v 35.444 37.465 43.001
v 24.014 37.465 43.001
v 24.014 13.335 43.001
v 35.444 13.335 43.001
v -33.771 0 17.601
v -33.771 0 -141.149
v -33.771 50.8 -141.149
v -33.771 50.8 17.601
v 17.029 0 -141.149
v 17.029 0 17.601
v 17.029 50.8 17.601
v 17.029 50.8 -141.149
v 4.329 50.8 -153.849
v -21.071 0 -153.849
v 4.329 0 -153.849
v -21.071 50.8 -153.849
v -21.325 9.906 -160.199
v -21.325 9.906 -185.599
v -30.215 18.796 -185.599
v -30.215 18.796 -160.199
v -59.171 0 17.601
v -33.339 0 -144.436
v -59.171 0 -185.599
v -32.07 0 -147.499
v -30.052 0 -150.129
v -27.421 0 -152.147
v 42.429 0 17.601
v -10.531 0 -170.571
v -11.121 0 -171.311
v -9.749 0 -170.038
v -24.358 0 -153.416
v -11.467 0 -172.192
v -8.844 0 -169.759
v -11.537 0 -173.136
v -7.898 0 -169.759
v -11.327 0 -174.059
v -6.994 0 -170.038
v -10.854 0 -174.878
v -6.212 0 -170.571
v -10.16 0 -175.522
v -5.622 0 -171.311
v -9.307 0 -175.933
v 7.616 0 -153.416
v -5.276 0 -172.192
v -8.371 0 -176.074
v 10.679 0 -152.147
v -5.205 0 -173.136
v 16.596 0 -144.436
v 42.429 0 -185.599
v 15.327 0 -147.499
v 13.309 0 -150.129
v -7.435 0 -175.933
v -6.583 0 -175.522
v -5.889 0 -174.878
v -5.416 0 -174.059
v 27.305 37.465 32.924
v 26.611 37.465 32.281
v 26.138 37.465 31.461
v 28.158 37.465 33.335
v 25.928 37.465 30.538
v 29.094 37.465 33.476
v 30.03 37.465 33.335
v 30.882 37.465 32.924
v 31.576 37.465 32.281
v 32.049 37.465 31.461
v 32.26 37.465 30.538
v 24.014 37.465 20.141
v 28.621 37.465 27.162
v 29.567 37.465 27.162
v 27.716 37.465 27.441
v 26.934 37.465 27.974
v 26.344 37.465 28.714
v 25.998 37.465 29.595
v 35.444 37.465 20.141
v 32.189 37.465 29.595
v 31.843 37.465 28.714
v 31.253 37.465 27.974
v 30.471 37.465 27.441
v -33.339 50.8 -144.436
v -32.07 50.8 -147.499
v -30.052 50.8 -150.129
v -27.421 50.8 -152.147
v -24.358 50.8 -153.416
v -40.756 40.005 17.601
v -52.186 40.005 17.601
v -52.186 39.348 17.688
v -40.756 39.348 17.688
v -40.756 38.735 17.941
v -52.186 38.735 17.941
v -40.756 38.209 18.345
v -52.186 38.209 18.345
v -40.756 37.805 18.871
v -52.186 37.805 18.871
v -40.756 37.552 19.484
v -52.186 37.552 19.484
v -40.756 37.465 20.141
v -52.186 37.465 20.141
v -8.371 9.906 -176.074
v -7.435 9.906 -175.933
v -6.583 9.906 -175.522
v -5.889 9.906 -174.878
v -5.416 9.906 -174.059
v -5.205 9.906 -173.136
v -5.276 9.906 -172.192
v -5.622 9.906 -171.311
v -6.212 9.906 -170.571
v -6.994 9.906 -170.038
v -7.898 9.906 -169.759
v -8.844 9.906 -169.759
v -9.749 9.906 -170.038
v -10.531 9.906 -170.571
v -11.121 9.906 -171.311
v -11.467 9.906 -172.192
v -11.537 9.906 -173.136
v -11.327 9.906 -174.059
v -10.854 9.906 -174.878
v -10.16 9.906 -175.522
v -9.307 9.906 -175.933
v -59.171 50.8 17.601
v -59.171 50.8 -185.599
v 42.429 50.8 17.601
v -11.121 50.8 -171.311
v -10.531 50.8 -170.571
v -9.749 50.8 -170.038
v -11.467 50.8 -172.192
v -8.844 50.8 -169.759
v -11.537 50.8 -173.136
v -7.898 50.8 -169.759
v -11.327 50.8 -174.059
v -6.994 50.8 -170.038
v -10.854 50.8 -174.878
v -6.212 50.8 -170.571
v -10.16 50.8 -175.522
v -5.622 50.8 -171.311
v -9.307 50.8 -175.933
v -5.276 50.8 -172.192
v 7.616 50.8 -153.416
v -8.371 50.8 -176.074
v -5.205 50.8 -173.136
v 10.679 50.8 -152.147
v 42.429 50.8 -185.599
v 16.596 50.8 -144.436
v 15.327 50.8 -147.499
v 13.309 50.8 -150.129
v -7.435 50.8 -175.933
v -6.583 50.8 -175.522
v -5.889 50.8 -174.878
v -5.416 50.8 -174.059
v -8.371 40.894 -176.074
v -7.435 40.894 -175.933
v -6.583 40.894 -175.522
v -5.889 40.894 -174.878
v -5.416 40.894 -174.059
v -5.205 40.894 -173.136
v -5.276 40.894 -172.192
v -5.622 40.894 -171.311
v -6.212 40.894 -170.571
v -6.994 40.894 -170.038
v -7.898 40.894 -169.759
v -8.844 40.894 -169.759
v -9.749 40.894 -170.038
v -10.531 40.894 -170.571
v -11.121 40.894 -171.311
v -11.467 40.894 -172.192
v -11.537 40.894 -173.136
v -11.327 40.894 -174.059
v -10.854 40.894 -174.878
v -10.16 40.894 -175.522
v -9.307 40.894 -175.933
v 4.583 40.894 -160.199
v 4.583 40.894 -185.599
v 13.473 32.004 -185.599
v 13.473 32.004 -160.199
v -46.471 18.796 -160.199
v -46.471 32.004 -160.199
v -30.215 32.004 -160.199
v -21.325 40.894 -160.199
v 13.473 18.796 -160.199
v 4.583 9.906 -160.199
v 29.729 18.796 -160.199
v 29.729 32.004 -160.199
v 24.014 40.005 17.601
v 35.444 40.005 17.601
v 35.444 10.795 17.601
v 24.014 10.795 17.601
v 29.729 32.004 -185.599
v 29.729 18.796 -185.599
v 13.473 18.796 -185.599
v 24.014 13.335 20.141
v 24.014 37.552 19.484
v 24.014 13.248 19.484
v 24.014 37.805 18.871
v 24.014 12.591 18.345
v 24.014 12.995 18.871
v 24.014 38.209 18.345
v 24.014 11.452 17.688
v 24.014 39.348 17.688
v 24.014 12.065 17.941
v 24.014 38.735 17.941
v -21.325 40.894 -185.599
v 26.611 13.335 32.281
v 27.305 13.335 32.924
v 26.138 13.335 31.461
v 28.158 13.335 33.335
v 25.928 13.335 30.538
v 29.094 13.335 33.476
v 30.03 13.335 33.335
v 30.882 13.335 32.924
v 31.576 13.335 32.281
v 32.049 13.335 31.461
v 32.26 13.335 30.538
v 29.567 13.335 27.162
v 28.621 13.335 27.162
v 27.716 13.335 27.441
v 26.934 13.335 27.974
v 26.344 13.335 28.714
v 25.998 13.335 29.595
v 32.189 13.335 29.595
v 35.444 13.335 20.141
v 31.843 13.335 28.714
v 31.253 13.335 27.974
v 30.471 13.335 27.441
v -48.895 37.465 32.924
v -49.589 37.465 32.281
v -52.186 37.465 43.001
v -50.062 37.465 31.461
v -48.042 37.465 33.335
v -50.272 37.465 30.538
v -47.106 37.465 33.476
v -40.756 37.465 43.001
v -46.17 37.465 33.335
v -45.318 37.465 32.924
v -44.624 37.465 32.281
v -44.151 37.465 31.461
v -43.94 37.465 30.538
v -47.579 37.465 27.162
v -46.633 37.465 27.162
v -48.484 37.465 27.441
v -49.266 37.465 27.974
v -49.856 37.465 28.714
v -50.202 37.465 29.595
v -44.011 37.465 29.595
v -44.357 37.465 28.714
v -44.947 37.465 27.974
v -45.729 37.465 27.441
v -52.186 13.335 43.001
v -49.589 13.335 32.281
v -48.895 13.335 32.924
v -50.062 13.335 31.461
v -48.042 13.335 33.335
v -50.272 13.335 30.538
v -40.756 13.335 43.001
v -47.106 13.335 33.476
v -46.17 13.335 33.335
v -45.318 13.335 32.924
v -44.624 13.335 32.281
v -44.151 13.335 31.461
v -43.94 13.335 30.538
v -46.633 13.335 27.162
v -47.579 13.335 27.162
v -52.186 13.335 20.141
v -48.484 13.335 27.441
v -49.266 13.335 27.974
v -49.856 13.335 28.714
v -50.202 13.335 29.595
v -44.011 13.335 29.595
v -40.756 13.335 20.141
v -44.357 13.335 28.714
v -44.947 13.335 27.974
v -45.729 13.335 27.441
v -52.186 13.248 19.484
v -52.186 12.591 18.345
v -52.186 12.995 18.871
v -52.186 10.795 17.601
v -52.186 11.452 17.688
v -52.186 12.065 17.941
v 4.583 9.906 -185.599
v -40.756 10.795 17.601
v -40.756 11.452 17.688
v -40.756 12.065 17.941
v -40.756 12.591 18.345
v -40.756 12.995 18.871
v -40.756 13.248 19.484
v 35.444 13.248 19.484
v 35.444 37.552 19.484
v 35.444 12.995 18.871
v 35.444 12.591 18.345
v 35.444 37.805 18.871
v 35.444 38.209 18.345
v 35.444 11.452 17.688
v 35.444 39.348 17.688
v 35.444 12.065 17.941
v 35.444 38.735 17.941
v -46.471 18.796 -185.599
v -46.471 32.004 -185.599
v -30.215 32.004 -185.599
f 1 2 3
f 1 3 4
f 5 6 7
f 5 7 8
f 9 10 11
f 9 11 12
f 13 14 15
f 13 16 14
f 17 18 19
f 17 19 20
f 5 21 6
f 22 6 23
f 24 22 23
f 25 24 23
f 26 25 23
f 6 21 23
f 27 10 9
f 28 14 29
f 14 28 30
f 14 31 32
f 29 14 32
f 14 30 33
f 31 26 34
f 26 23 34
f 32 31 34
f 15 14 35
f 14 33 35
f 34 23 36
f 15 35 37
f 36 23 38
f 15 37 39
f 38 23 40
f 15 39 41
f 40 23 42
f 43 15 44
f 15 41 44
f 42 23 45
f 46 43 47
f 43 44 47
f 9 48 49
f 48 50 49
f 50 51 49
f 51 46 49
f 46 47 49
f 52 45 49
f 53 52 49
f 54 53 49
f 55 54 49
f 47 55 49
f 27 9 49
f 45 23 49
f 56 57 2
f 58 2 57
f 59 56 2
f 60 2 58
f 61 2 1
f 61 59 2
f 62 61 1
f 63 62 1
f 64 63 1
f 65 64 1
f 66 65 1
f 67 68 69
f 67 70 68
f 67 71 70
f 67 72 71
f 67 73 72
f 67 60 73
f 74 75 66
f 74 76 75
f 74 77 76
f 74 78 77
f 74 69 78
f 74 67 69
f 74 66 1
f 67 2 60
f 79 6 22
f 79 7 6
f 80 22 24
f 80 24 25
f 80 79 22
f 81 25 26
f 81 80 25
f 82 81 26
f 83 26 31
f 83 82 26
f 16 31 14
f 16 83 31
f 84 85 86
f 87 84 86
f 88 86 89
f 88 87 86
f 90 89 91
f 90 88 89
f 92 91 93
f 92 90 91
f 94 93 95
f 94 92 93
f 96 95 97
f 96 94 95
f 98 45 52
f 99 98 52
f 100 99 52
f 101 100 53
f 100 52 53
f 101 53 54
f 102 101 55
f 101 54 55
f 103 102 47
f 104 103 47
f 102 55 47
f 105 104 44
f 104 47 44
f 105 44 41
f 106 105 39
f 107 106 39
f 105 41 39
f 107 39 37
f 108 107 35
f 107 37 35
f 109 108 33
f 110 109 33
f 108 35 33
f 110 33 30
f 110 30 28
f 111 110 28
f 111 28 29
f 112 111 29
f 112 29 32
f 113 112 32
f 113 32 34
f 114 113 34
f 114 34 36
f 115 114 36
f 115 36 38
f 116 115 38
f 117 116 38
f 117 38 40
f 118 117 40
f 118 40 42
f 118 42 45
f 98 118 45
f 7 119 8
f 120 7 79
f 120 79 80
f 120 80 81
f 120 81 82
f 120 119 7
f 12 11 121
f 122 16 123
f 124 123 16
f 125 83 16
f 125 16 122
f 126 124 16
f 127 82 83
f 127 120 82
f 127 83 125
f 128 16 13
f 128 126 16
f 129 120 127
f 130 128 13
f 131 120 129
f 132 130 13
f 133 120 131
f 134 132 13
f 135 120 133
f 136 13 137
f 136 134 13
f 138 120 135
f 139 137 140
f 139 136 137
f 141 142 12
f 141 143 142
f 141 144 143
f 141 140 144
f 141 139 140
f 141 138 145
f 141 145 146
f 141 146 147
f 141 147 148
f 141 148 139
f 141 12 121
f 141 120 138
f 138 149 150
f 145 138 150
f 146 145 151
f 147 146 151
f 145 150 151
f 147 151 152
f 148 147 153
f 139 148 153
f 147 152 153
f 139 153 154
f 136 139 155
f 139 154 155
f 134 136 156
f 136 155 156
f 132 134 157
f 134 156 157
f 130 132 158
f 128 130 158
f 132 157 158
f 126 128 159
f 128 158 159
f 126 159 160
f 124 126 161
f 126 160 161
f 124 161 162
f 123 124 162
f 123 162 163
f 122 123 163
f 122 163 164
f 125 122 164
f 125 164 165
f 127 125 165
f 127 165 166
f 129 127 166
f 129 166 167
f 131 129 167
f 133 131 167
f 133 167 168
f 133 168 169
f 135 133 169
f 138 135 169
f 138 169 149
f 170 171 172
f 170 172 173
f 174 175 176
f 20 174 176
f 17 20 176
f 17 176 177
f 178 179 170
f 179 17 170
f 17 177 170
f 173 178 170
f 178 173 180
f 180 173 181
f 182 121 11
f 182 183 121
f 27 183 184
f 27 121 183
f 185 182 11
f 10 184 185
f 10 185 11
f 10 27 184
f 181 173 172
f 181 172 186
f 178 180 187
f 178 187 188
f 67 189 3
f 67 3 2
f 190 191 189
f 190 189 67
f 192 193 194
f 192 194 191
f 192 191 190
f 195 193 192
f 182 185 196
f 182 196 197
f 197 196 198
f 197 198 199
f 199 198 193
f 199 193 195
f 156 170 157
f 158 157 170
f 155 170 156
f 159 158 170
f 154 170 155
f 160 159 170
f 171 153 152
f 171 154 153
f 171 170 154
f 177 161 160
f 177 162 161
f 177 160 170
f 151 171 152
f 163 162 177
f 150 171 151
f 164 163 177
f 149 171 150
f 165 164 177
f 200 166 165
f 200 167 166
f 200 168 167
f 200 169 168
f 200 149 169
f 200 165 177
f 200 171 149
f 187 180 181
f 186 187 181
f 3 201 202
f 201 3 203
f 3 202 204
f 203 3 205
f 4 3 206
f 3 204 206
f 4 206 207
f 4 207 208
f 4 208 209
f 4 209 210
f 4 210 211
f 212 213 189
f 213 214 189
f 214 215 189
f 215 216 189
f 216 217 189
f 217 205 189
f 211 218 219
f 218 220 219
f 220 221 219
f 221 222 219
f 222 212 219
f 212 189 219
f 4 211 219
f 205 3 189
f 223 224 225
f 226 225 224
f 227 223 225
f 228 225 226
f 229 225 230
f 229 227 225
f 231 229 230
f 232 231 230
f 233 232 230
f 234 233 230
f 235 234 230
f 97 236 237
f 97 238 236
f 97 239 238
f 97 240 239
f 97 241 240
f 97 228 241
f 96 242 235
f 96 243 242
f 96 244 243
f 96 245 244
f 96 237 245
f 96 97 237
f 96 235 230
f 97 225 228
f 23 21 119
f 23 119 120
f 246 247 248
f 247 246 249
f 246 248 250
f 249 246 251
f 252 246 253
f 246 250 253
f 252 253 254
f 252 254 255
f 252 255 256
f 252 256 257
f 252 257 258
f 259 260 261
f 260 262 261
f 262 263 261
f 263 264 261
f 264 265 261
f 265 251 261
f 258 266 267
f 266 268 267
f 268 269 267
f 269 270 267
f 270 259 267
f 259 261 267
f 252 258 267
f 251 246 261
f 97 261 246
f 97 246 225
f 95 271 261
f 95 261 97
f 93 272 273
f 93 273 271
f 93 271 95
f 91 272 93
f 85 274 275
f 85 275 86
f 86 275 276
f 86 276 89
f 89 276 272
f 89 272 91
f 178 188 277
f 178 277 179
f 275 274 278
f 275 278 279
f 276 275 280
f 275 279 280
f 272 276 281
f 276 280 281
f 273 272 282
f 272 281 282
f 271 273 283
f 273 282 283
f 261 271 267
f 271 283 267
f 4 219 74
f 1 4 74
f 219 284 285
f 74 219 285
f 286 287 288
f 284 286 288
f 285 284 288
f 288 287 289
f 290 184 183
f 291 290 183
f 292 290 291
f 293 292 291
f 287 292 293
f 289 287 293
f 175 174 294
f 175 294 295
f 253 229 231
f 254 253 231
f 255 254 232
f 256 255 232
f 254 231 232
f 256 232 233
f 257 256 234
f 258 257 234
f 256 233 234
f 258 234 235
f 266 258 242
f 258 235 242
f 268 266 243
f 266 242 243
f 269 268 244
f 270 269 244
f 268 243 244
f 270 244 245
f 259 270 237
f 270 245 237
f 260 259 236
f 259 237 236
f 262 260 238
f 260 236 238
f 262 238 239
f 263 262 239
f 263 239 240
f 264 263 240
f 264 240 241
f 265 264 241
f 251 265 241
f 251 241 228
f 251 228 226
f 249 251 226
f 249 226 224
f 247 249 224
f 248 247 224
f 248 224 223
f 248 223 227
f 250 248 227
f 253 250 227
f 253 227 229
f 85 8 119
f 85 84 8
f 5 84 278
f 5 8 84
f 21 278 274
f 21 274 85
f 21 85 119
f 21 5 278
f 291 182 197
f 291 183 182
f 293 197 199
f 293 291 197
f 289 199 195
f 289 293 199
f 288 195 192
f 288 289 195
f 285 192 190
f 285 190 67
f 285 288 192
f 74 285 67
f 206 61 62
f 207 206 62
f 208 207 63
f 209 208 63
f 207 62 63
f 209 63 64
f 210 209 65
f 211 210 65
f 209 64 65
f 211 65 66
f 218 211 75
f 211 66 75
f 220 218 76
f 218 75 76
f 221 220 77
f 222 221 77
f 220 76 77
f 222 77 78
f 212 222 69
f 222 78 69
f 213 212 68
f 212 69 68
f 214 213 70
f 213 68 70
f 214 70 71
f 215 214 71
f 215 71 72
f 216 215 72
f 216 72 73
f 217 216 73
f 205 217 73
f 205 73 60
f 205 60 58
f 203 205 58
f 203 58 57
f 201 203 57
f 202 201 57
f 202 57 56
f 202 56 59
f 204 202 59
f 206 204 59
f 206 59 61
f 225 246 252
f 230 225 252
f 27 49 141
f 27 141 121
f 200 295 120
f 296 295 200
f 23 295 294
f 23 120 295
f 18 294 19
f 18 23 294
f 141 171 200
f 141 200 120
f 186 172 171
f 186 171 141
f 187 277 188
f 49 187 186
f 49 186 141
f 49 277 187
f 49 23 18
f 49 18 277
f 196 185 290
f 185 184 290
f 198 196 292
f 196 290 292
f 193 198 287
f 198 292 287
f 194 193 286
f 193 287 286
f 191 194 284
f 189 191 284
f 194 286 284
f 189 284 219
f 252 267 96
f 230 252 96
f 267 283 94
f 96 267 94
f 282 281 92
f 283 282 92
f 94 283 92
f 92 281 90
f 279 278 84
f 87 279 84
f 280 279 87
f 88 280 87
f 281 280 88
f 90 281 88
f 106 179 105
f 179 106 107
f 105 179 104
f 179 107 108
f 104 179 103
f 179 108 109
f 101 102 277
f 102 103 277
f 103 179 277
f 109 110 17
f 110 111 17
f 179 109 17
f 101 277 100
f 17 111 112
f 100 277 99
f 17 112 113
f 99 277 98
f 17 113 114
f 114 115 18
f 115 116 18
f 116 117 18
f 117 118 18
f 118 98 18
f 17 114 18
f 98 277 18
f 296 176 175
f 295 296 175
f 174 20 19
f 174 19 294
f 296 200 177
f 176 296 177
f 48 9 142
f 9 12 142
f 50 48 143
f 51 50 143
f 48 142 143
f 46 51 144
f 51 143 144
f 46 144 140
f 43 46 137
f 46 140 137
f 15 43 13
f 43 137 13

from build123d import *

# Parameters (mm, degrees)
BOSS_EXTRUDE1_DEPTH = 50.8
SKETCH2_W           = 11.43
SKETCH2_H           = 24.13
BOSS_EXTRUDE2_DEPTH = 25.4
FILLET3_R           = 2.54
SKETCH3_R           = 3.175
CUT_EXTRUDE1_DEPTH  = 199.372898559
SKETCH4_W           = 25.146
SKETCH4_H           = 13.208
SKETCH4_W_2         = 25.908
SKETCH4_H_2         = 8.89
CUT_EXTRUDE2_DEPTH  = 25.4
CHAMFER1_SIZE       = 8.89
SKETCH5_R           = 3.175
CUT_EXTRUDE3_DEPTH  = 202.317710741
SKETCH7_W           = 50.8
SKETCH7_H           = 50.8
BOSS_EXTRUDE4_DEPTH = 6.35
FILLET4_R           = 12.7


with BuildPart() as part:
    # Sketch1 → Boss-Extrude1 (new body)
    with BuildSketch(Plane(origin=(0, 0, 0), x_dir=(1, 0, 0), z_dir=(0, 1, 0))):
        Polygon((-59.171267606, -17.601126761), (-59.171267606, 185.598873239), (42.428732394, 185.598873239), (42.428732394, -17.601126761), (17.028732394, -17.601126761), (17.028732394, 160.198873239), (-33.771267606, 160.198873239), (-33.771267606, -17.601126761), align=None)
    extrude(amount=BOSS_EXTRUDE1_DEPTH)

    # Sketch2 → Boss-Extrude2 (add)
    with BuildSketch(Plane.XY.offset(17.601126761)):
        with Locations((-46.471267606, 25.4)):
            Rectangle(SKETCH2_W, SKETCH2_H)
        with Locations((29.728732394, 25.4)):
            Rectangle(SKETCH2_W, SKETCH2_H)
    extrude(amount=BOSS_EXTRUDE2_DEPTH)

    # Fillet3
    fillet3_edges = [part.edges().sort_by_distance(p)[0] for p in [
        (-46.471267606, 37.465, 17.601126761),
        (-46.471267606, 13.335, 17.601126761),
        (29.728732394, 37.465, 17.601126761),
        (29.728732394, 13.335, 17.601126761),
    ]]
    fillet(fillet3_edges, radius=FILLET3_R)

    # Sketch3 → Cut-Extrude1 (cut, through all)
    with BuildSketch(Plane(origin=(0, 37.465, 0), x_dir=(1, 0, 0), z_dir=(0, 1, 0))):
        with Locations(Location((-47.106267606, -30.301126761, 0), (0, 0, 270))):
            Circle(SKETCH3_R)
        with Locations(Location((29.093732394, -30.301126761, 0), (0, 0, 270))):
            Circle(SKETCH3_R)
    extrude(amount=-CUT_EXTRUDE1_DEPTH, mode=Mode.SUBTRACT)

    # Sketch4 → Cut-Extrude2 (cut)
    with BuildSketch(Plane(origin=(0, 0, -185.598873239), x_dir=(-1, 0, 0), z_dir=(0, 0, -1))):
        with Locations((-17.155732394, 25.4)):
            Rectangle(SKETCH4_W, SKETCH4_H)
        with Locations((8.371267606, 25.4)):
            Rectangle(SKETCH4_W_2, SKETCH4_H)
        with Locations((8.371267606, 36.449)):
            Rectangle(SKETCH4_W_2, SKETCH4_H_2)
        with Locations((33.898267606, 25.4)):
            Rectangle(SKETCH4_W, SKETCH4_H)
        with Locations((8.371267606, 14.351)):
            Rectangle(SKETCH4_W_2, SKETCH4_H_2)
    extrude(amount=-CUT_EXTRUDE2_DEPTH, mode=Mode.SUBTRACT)

    # Chamfer1
    chamfer1_edges = [part.edges().sort_by_distance(p)[0] for p in [
        (-21.325267606, 32.004, -172.898873239),
        (-21.325267606, 18.796, -172.898873239),
        (4.582732394, 18.796, -172.898873239),
        (4.582732394, 32.004, -172.898873239),
    ]]
    chamfer(chamfer1_edges, length=CHAMFER1_SIZE - 0.0001)  # a hair under: the kernel refuses the full size

    # Sketch5 → Cut-Extrude3 (cut, through all)
    with BuildSketch(Plane.XZ):
        with Locations(Location((-8.371267606, -172.898873239, 0), (0, 0, 270))):
            Circle(SKETCH5_R)
    extrude(amount=-CUT_EXTRUDE3_DEPTH, mode=Mode.SUBTRACT)

    # Sketch7 → Boss-Extrude4 (add)
    with BuildSketch(Plane.XY.offset(-160.198873239)):
        with Locations((-8.371267606, 25.4)):
            Rectangle(SKETCH7_W, SKETCH7_H)
    extrude(amount=BOSS_EXTRUDE4_DEPTH)

    # Fillet4
    fillet4_edges = [part.edges().sort_by_distance(p)[0] for p in [
        (-33.771267606, 25.4, -153.848873239),
        (17.028732394, 25.4, -153.848873239),
    ]]
    fillet(fillet4_edges, radius=FILLET4_R)


solid = part.part
